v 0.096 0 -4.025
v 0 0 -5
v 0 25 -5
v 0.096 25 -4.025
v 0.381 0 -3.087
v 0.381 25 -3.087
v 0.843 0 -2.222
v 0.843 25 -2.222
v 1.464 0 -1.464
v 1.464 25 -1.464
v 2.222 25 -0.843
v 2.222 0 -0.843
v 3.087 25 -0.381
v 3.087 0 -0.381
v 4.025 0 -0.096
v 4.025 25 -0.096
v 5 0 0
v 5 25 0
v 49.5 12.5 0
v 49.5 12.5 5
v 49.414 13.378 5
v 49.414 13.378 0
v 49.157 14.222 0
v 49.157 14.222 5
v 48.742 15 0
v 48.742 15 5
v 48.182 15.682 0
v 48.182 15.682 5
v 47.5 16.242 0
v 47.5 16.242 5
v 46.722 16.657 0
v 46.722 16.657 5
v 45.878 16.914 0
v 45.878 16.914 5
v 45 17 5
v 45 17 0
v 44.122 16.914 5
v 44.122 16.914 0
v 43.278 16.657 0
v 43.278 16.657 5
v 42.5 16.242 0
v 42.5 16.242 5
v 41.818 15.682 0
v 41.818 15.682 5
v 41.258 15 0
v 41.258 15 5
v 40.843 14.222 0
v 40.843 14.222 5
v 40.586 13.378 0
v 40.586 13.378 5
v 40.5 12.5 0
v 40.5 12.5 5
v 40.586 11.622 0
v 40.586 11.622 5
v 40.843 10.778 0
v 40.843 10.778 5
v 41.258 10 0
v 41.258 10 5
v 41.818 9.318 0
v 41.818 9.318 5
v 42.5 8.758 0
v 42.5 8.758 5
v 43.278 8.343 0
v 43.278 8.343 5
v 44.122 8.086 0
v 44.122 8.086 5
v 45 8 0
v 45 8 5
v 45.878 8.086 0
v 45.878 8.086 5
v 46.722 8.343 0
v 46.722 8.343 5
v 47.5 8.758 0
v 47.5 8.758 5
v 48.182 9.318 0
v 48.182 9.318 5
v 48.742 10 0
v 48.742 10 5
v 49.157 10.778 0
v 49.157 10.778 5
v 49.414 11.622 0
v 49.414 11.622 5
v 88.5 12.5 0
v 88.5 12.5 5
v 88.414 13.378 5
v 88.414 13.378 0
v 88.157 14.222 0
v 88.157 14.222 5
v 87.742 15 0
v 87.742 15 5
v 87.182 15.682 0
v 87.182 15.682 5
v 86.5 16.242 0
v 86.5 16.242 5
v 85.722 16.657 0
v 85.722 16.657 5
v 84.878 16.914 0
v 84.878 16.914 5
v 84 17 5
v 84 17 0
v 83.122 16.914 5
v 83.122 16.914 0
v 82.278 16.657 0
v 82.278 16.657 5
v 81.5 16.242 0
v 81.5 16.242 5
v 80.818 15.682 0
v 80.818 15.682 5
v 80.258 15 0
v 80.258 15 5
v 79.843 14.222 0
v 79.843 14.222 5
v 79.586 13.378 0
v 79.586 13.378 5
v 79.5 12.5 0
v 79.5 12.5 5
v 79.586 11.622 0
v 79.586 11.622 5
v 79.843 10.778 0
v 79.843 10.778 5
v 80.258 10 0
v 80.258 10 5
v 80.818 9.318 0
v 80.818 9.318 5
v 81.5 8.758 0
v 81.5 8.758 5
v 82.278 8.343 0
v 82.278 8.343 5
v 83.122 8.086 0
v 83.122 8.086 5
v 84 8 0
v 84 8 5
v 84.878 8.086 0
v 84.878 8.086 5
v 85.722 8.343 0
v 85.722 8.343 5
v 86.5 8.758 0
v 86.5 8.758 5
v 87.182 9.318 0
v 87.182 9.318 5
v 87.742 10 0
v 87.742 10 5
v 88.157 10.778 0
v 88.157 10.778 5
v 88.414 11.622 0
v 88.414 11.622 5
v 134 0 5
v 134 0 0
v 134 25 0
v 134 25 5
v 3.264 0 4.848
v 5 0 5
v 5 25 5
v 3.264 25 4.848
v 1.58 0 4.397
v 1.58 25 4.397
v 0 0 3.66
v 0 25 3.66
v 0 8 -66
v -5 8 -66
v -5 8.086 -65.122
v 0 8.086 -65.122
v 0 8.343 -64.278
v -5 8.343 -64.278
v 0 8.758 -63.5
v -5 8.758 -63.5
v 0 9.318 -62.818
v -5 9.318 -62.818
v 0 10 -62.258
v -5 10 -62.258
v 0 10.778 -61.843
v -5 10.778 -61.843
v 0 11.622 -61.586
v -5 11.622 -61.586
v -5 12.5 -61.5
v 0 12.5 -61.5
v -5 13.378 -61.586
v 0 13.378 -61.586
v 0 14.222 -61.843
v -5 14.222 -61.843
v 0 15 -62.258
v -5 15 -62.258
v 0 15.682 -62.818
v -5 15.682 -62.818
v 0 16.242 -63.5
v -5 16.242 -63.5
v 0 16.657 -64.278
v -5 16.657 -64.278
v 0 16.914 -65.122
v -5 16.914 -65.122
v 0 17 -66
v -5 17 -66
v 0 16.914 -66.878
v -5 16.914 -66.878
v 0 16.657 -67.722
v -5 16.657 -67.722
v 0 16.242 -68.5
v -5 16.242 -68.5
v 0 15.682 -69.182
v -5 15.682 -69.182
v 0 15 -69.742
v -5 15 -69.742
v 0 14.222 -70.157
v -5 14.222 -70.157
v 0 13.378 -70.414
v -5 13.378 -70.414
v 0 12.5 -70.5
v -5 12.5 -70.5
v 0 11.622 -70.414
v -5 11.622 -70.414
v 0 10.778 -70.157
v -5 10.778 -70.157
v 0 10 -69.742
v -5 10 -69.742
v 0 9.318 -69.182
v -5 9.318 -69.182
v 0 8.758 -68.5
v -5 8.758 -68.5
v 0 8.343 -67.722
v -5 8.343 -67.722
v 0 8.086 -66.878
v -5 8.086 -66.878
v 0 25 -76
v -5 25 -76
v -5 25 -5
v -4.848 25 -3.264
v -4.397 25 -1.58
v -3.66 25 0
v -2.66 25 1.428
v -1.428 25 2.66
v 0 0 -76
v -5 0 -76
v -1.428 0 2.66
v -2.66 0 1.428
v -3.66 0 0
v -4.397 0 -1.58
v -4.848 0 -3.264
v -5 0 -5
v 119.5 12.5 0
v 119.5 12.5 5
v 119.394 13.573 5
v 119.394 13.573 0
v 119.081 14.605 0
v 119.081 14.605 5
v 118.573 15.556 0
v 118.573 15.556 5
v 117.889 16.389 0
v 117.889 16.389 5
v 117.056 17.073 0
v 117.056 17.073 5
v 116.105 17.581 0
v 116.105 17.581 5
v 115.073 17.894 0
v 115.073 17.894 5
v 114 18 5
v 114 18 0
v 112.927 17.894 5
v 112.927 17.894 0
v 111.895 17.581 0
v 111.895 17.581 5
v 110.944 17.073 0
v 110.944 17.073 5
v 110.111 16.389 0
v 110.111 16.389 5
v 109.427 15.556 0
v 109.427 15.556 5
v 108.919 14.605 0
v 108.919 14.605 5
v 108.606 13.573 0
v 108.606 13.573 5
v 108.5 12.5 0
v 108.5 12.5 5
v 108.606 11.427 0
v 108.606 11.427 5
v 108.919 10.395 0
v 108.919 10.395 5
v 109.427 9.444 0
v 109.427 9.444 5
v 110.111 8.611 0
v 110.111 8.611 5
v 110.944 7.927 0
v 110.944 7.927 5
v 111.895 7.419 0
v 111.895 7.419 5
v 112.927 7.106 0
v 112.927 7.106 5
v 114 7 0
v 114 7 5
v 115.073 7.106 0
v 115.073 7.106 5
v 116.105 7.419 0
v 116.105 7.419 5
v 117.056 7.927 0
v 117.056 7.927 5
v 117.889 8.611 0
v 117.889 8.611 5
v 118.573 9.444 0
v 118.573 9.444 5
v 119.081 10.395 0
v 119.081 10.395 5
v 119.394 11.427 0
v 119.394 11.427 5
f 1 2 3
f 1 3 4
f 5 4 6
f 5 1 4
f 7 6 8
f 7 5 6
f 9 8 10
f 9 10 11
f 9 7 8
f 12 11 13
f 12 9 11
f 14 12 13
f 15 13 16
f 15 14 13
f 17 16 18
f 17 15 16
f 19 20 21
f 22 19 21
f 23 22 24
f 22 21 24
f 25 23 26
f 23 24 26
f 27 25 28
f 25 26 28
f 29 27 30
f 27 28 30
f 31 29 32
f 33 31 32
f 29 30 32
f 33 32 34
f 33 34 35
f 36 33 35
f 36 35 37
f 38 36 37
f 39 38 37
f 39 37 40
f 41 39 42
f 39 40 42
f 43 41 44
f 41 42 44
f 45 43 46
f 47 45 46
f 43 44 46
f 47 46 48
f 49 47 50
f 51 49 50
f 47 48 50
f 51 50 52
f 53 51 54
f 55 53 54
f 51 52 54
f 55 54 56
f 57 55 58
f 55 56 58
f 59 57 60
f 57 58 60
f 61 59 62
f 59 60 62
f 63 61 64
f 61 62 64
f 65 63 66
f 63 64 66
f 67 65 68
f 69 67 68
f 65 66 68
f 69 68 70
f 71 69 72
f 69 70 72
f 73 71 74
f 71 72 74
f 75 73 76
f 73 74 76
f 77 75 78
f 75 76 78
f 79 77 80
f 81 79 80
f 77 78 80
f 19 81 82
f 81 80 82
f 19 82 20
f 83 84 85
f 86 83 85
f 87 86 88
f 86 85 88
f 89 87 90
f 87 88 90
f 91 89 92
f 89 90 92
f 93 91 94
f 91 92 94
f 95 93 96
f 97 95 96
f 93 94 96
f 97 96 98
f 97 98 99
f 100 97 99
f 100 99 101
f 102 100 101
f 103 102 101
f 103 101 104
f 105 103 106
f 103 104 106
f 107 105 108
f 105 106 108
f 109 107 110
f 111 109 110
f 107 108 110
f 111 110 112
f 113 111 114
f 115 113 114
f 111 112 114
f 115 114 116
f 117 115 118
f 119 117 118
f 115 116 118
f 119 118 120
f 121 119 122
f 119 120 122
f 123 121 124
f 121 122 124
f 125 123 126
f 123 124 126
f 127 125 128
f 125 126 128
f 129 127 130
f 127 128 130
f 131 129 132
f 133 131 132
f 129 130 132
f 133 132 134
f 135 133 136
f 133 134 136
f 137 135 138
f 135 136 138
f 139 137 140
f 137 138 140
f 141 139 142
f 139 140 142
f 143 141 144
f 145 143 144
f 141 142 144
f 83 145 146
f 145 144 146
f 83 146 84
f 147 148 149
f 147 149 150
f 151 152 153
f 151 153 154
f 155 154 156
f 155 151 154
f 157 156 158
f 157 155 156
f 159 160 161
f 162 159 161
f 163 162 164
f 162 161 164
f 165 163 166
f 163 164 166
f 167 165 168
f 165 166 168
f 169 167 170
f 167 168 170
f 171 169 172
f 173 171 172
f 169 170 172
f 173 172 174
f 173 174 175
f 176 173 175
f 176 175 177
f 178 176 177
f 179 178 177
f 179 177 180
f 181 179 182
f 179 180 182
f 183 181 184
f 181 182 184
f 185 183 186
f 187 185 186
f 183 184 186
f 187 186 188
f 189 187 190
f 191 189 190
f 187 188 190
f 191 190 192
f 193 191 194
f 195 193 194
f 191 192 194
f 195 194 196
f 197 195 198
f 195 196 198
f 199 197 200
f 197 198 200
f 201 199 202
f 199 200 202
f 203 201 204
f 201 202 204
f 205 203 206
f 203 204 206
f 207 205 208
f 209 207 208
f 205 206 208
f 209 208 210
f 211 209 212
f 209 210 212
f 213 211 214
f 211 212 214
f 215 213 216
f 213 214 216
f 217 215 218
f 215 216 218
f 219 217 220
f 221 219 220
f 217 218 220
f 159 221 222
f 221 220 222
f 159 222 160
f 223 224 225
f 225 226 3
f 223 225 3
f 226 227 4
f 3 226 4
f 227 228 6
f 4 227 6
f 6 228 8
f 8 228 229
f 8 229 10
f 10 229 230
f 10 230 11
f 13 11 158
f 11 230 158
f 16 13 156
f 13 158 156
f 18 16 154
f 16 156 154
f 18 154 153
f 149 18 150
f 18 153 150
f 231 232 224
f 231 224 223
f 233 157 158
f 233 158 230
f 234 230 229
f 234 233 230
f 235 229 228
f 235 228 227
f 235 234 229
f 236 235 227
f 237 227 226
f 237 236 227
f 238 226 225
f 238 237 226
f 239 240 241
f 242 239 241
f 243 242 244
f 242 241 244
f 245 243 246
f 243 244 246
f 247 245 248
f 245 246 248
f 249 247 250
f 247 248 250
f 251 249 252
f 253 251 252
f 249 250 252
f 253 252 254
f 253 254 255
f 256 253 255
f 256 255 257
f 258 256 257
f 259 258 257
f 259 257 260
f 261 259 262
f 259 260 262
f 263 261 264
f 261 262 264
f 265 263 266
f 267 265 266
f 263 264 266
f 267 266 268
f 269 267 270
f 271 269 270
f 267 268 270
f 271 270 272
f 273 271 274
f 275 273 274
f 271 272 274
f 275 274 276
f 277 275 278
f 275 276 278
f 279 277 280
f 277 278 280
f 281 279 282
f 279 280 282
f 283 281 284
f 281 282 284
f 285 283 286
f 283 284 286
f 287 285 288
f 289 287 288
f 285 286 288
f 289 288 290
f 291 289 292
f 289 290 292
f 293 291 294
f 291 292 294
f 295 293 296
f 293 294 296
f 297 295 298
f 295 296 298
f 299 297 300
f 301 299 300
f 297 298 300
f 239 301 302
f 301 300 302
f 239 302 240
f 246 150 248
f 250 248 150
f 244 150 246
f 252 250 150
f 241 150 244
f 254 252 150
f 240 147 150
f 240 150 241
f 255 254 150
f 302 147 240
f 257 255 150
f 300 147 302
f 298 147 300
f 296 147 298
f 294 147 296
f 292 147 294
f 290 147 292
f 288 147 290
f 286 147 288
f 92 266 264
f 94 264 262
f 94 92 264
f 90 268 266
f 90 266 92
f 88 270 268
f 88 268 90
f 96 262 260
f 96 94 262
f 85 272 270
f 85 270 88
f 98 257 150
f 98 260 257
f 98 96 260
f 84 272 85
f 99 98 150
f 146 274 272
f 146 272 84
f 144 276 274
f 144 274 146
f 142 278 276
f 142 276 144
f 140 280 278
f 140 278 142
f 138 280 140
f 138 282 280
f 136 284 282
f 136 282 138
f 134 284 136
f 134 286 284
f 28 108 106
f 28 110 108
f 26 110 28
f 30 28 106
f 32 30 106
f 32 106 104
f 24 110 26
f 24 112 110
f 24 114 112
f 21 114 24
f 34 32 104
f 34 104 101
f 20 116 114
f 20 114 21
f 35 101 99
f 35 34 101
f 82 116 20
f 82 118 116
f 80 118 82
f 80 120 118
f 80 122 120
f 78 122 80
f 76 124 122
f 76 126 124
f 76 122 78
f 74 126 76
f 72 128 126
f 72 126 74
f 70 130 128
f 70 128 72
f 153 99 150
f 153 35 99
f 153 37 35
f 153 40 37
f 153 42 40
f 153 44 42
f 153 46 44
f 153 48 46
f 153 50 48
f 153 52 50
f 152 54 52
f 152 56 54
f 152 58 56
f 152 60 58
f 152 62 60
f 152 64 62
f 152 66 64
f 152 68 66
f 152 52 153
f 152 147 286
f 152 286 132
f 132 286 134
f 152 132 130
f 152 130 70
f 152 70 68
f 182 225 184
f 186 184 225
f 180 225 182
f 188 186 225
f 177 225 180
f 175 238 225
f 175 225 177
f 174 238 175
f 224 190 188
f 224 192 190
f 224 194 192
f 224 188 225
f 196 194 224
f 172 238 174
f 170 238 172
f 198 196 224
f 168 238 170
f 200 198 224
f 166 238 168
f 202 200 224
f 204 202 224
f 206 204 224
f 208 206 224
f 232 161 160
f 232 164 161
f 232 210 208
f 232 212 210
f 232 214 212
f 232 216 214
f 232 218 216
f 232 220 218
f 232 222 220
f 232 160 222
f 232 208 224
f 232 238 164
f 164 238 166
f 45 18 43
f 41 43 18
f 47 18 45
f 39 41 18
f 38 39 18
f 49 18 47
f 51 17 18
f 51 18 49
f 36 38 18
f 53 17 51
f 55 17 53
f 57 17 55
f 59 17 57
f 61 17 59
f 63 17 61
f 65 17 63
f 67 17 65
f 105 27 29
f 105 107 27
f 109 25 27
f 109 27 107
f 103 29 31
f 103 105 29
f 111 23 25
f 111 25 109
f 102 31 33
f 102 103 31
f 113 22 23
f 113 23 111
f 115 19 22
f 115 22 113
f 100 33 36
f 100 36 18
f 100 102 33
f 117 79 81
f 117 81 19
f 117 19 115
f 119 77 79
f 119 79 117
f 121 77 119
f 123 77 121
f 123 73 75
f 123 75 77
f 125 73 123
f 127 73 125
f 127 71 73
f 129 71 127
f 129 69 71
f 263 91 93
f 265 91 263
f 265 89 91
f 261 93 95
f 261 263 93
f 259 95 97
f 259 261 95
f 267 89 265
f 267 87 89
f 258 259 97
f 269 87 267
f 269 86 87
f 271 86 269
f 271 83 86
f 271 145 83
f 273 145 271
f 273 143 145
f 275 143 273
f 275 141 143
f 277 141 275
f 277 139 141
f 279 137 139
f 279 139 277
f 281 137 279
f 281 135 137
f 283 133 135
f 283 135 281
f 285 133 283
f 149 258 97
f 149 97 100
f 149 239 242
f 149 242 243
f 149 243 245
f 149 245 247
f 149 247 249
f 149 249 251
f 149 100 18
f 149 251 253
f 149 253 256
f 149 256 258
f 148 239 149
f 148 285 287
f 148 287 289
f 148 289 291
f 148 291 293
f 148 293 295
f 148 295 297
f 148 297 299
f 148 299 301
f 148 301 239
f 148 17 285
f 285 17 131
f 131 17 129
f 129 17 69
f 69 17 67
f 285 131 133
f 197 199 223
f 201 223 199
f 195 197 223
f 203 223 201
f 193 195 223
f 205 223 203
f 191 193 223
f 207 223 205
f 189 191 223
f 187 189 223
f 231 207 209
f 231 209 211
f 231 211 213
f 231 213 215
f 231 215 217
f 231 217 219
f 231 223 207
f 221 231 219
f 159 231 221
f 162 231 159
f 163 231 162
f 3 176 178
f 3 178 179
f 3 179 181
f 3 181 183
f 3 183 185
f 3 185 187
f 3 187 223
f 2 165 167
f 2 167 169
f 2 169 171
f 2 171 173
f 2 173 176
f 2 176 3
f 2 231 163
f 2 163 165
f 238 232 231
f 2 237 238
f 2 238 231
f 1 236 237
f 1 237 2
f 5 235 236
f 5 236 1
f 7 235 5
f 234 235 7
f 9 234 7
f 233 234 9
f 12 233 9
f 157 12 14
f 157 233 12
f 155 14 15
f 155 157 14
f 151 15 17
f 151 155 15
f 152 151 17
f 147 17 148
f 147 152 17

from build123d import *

# Parameters (mm, degrees)
F1_DEPTH = 25
F2_R     = 5.5
F2_R_2   = 4.5
F3_DEPTH = 5
F4_DEPTH = 5
F5_R     = 4.5
F6_DEPTH = 5


# Not quite as in the source:
# - ends of sketch curves that miss each other by under 0.0002 mm in the source are joined


with BuildPart() as f1:
    # F0 (on Front) → F1 (new body)
    with BuildSketch(Plane.XZ):
        with BuildLine():
            Line((134, 0), (134, 5))
            Line((134, 5), (5, 5))
            ThreePointArc((5, 5), (2.4118095455, 4.6592580848), (0, 3.6602538402))
            Line((0, 3.6602538402), (0, 0))
            Line((0, 0), (5, 0))
            Line((5, 0), (134, 0))
        make_face()
        with BuildLine():
            Line((0, 0), (0, 3.6602538402))
            ThreePointArc((0, 3.6602538402), (-3.6602539143, -1.284e-07), (-4.9999998289, -5))
            Line((-4.9999998289, -5), (-5, -76))
            Line((-5, -76), (0, -76))
            Line((0, -76), (0, -5))
            Line((0, -5), (0, 0))
        make_face()
        with BuildLine():
            ThreePointArc((0, -5), (1.4644660941, -1.4644660941), (5, 0))
            Line((5, 0), (0, 0))
            Line((0, 0), (0, -5))
        make_face()
    extrude(amount=-F1_DEPTH)

    # F2 (on face) → F3 (cut)
    with BuildSketch(Plane.XY.offset(5)):
        with Locations((114, 12.5)):
            Circle(F2_R)
        with Locations((84, 12.5)):
            Circle(F2_R_2)
        with Locations((45, 12.5)):
            Circle(F2_R_2)
    extrude(amount=-F3_DEPTH, mode=Mode.SUBTRACT)

    # F2 (on face) → F4 (cut)
    with BuildSketch(Plane.XY.offset(5)):
        with Locations((114, 12.5)):
            Circle(F2_R)
        with Locations((84, 12.5)):
            Circle(F2_R_2)
        with Locations((45, 12.5)):
            Circle(F2_R_2)
    extrude(amount=-F4_DEPTH, mode=Mode.SUBTRACT)

    # F5 (on face) → F6 (cut)
    with BuildSketch(Plane(origin=(-5, 0, 0), x_dir=(0, -1, 0), z_dir=(-1, 0, 0))):
        with Locations((-12.5, -66)):
            Circle(F5_R)
    extrude(amount=-F6_DEPTH, mode=Mode.SUBTRACT)


solid = f1.part
